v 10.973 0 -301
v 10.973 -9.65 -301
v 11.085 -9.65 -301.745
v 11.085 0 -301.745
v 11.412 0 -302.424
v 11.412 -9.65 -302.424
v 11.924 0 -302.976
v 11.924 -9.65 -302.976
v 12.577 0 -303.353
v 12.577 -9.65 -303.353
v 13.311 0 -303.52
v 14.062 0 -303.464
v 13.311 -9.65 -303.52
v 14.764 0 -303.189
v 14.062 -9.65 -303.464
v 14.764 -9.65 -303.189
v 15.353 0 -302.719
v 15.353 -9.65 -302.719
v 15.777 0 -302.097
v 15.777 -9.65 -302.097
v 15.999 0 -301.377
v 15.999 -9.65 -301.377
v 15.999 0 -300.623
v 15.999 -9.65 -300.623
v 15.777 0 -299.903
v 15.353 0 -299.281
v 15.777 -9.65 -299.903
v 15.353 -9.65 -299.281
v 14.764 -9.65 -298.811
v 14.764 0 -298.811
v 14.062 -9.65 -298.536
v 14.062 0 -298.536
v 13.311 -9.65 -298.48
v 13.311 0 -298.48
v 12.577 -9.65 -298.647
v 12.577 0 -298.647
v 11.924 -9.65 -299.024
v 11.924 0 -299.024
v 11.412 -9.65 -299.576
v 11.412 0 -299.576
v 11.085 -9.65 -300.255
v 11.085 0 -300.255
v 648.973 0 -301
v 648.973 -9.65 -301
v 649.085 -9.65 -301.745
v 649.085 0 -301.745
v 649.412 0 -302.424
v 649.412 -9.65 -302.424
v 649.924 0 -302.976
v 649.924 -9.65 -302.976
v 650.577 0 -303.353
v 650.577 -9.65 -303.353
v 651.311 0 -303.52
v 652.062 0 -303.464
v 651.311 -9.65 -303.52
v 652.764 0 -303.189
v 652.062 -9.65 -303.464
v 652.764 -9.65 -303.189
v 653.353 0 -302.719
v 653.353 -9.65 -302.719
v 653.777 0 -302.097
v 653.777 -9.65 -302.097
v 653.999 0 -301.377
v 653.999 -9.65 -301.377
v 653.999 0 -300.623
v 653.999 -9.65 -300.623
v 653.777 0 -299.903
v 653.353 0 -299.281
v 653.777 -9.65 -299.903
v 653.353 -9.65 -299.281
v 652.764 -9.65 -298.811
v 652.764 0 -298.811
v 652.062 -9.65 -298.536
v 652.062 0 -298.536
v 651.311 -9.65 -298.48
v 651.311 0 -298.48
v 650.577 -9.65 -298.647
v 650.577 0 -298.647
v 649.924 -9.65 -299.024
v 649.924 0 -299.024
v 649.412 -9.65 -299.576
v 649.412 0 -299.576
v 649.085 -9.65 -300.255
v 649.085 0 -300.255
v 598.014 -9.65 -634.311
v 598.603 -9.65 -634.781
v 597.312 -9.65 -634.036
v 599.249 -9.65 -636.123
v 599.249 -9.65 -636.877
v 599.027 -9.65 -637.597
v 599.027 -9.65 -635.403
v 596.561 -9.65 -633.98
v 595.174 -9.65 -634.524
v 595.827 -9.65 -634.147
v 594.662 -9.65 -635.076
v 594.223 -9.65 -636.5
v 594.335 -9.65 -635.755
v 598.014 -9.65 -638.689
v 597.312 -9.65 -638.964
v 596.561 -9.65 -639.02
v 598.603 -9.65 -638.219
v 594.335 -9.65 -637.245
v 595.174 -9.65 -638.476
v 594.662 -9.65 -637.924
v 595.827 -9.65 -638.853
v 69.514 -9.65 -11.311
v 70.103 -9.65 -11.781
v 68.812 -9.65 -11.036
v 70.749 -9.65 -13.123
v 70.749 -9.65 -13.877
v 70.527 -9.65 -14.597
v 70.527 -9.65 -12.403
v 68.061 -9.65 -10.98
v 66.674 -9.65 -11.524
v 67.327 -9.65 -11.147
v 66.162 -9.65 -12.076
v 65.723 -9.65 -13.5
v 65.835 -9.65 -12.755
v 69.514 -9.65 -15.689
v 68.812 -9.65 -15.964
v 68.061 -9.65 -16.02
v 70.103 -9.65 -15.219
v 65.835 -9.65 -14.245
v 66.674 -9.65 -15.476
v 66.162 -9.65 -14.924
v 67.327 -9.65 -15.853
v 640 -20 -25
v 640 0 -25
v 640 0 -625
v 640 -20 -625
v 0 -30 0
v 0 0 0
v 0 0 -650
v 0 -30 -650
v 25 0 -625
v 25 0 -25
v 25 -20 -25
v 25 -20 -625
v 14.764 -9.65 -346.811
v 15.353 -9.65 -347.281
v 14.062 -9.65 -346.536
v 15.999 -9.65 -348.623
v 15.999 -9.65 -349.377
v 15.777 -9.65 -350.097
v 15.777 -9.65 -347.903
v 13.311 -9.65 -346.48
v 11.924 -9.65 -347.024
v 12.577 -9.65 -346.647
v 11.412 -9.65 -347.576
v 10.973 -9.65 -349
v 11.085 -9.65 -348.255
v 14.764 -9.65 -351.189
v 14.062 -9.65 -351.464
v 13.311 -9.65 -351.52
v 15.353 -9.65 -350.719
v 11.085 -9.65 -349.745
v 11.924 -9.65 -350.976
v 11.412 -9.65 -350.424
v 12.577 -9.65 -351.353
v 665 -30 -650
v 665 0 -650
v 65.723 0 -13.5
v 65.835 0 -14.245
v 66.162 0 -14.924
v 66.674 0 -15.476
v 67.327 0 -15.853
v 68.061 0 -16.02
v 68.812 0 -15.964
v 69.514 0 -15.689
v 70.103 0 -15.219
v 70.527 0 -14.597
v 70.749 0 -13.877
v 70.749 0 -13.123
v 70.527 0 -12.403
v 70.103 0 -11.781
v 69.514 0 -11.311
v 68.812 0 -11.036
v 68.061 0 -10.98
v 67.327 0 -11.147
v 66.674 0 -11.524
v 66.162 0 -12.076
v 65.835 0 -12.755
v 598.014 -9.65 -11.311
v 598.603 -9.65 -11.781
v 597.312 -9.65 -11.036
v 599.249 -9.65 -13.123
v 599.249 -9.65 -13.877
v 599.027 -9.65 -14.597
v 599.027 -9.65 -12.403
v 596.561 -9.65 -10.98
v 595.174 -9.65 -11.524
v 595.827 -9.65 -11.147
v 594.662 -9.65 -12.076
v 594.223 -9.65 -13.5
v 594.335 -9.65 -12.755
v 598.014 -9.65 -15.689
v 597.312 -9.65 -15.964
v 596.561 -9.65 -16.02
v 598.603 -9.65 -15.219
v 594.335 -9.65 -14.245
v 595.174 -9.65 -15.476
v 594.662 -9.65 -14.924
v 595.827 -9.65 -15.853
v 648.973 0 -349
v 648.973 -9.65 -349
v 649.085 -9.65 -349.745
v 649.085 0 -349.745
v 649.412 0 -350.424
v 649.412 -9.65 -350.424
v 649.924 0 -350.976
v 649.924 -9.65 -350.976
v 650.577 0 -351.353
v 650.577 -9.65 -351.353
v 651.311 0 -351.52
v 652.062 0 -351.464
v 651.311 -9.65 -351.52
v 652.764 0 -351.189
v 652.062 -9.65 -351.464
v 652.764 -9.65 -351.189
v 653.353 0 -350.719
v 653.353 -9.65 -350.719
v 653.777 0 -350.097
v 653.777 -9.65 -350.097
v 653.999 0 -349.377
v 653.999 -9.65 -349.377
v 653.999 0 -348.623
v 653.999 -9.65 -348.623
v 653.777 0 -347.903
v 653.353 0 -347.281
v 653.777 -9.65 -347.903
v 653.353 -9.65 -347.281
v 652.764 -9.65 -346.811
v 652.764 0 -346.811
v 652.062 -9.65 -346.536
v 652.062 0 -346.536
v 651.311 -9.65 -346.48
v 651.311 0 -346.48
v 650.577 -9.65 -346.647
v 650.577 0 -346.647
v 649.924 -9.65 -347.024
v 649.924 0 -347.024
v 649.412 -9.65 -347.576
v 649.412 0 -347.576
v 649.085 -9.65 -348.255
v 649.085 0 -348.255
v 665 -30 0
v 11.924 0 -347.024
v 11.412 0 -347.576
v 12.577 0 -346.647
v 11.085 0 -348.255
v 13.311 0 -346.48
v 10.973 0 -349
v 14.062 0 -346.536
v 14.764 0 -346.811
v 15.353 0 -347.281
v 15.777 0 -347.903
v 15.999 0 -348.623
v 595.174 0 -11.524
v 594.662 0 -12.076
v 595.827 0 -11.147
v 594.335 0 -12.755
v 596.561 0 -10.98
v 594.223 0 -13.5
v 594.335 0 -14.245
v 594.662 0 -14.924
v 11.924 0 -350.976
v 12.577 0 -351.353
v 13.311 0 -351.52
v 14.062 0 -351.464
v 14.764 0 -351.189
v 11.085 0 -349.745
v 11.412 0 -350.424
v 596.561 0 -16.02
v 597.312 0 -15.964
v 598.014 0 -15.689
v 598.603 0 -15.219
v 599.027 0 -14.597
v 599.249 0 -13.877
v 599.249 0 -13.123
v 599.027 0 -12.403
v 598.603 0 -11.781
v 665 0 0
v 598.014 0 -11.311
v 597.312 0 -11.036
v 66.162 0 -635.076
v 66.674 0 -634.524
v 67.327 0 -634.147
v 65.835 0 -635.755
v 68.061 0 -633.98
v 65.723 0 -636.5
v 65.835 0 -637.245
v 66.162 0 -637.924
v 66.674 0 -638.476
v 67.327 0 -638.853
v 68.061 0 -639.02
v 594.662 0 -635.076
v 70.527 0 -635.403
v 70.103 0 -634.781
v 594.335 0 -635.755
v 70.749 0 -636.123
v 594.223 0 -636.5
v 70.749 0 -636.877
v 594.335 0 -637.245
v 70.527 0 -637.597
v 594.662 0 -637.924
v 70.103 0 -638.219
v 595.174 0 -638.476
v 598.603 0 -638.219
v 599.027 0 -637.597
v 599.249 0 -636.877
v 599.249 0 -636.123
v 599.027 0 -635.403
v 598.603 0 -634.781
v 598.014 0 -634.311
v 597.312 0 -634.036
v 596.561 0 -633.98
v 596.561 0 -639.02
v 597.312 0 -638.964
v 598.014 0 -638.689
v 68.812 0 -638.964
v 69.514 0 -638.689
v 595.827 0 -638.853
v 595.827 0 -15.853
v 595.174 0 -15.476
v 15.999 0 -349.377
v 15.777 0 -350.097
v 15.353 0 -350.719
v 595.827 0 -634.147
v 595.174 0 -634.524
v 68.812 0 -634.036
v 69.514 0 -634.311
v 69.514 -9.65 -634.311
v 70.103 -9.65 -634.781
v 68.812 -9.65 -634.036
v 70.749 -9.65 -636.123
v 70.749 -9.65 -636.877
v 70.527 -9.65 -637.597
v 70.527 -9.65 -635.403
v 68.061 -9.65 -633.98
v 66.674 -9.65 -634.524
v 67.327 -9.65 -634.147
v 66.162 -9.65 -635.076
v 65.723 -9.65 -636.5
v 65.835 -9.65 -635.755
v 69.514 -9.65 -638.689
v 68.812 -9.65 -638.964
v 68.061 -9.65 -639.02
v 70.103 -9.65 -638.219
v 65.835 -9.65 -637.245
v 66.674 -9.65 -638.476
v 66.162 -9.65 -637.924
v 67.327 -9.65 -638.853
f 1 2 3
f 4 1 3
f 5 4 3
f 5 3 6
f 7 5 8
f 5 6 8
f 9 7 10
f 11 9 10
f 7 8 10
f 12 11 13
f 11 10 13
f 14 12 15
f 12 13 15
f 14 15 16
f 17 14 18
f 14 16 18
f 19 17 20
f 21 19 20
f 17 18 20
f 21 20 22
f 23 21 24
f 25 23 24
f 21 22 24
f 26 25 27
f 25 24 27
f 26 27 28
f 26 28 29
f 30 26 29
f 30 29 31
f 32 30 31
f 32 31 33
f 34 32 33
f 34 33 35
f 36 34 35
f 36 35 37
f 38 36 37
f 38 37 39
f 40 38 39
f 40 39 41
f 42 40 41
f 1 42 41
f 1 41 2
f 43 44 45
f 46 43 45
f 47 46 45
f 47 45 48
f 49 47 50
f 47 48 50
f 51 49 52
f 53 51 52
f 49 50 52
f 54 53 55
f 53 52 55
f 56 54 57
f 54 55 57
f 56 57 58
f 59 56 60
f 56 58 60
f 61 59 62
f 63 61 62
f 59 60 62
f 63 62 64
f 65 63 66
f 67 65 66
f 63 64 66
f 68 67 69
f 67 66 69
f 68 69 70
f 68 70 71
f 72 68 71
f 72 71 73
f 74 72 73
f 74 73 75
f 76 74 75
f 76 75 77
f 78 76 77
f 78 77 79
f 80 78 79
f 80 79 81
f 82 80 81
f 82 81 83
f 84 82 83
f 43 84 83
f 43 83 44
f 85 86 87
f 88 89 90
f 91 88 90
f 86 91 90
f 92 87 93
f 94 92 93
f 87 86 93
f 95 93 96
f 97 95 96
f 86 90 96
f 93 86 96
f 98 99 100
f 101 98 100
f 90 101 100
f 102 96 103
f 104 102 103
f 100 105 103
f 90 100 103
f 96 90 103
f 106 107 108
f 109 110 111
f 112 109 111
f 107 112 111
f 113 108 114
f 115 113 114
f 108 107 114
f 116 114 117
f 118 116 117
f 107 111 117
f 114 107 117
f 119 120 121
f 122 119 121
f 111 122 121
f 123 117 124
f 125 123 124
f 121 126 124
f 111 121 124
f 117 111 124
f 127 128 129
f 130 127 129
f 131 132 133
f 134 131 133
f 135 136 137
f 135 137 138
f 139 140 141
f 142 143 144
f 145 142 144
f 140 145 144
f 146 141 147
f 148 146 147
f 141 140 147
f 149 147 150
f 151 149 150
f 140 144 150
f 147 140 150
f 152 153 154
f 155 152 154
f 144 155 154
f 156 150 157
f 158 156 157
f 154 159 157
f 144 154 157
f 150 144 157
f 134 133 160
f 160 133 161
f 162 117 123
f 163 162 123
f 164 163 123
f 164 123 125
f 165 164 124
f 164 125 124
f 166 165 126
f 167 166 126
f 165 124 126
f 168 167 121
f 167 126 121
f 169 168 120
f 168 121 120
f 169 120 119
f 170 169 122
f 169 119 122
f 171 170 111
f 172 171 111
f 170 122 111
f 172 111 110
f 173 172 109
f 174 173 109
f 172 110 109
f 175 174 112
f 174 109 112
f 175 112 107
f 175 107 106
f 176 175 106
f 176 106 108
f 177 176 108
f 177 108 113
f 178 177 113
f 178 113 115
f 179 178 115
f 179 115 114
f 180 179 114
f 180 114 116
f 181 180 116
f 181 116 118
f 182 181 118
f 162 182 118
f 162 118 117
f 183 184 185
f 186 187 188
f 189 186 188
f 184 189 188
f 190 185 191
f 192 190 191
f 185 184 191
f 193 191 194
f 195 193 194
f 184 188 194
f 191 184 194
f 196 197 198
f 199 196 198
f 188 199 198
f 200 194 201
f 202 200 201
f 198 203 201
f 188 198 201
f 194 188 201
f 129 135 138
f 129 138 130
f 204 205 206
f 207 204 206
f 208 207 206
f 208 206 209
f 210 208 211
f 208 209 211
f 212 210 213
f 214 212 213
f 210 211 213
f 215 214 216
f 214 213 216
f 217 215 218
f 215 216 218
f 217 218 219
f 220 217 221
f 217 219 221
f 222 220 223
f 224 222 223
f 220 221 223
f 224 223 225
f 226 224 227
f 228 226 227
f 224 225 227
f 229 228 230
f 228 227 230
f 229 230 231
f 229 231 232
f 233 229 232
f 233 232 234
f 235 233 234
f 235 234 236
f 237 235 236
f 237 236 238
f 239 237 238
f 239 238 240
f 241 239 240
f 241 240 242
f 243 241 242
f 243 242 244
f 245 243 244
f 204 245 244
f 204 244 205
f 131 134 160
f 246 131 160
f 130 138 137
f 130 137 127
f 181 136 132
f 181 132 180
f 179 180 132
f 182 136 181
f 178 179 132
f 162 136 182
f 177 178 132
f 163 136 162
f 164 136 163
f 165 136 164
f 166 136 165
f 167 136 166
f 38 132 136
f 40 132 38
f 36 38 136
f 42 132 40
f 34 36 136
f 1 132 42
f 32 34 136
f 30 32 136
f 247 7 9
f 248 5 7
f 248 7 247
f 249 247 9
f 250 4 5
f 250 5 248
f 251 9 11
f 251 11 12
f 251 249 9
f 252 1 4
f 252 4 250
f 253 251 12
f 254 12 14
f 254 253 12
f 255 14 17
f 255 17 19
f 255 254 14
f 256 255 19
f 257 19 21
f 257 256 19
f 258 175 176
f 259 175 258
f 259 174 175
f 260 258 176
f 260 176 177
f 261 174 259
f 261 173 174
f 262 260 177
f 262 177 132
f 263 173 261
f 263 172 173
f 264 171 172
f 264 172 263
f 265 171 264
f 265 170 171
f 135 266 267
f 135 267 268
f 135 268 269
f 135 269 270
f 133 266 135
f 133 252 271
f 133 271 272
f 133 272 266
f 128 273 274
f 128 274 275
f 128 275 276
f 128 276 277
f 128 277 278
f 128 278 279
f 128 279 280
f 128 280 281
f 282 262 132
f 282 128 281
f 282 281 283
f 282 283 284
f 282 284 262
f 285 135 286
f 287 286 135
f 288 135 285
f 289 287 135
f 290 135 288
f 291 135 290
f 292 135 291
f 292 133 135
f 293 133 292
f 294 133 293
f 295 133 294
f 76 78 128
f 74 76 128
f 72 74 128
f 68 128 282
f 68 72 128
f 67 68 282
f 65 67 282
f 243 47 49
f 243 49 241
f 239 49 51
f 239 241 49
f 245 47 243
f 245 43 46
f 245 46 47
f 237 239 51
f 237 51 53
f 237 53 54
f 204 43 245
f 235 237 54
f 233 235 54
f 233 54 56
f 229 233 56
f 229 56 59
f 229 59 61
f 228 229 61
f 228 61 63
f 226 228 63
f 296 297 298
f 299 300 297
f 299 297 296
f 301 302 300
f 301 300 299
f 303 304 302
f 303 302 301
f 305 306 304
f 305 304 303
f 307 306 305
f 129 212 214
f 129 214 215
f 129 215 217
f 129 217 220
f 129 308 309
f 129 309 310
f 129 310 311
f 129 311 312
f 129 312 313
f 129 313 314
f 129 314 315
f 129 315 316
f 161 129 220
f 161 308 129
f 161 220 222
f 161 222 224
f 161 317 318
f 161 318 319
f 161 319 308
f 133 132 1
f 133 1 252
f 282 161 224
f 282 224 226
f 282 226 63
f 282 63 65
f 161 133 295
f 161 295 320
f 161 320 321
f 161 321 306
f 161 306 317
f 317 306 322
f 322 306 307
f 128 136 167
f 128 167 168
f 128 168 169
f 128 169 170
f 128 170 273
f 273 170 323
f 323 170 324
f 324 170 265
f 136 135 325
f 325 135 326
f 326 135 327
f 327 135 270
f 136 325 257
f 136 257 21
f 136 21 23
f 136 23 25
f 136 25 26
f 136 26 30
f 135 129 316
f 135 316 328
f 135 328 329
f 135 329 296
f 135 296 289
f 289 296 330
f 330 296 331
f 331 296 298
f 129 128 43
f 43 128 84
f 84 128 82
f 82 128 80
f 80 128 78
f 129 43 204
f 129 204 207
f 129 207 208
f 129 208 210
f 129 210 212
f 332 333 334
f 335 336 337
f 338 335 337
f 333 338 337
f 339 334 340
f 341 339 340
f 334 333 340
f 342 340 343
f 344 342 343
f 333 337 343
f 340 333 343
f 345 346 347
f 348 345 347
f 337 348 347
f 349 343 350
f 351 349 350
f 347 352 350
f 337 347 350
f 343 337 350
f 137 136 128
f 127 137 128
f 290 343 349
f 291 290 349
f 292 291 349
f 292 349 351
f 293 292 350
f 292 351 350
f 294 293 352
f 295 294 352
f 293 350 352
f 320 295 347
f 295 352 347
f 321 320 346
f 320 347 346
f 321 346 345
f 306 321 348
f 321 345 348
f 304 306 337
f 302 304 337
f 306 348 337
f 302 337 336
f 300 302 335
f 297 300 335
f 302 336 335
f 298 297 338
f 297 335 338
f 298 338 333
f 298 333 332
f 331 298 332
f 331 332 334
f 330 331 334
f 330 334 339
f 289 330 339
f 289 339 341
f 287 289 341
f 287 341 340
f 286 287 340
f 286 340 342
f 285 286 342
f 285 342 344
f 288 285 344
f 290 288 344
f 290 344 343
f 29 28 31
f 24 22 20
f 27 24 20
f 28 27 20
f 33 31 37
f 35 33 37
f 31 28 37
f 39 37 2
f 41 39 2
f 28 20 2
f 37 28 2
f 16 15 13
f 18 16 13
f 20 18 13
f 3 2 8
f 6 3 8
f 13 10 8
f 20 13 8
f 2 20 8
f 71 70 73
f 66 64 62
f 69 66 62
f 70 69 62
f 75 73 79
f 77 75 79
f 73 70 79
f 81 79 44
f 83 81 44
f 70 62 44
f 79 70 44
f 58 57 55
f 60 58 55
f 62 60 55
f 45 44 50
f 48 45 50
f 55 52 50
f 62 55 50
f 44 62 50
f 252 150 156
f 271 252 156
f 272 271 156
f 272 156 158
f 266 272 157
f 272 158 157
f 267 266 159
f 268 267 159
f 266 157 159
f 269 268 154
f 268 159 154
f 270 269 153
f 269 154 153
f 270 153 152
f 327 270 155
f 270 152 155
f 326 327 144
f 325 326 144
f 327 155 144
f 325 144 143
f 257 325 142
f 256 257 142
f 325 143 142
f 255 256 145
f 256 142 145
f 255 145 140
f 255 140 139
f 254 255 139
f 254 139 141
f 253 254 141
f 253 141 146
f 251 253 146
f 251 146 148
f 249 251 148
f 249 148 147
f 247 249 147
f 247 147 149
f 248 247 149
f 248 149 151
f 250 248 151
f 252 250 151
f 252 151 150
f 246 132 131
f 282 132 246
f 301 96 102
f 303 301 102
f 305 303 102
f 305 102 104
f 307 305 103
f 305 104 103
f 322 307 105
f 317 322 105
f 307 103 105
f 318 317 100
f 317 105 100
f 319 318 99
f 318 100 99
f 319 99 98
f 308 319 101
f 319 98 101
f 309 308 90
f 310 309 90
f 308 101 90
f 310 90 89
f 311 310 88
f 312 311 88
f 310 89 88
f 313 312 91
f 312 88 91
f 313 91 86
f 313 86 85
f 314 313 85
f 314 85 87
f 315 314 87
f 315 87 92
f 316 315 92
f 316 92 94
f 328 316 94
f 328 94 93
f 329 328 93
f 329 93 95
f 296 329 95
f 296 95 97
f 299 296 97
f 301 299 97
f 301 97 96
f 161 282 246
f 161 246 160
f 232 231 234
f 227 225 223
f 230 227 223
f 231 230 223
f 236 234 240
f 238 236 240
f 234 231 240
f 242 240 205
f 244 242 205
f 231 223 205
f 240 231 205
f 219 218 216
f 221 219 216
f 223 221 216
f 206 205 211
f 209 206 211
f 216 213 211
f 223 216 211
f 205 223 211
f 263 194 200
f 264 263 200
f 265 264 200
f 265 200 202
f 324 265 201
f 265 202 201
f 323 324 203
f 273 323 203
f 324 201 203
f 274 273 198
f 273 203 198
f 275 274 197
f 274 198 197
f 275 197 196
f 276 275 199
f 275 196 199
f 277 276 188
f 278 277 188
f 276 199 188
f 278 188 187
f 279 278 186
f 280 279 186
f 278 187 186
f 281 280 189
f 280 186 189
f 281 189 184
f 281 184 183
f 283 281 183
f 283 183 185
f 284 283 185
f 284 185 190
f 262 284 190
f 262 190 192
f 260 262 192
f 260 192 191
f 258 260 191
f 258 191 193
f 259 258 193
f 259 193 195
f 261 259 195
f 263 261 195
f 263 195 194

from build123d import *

# Parameters (mm, degrees)
SKETCH1_W                      = 665
SKETCH1_H                      = 650
BOSS_EXTRUDE1_DEPTH            = 30
F_8_0_199_DIAMETER_HOLE1_D     = 5.0546
F_8_0_199_DIAMETER_HOLE1_DEPTH = 9.65
SKETCH4_W                      = 615
SKETCH4_H                      = 600
CUT_EXTRUDE1_DEPTH             = 20


with BuildPart() as part:
    # Sketch1 → Boss-Extrude1 (new body)
    with BuildSketch(Plane(origin=(0, 0, 0), x_dir=(1, 0, 0), z_dir=(0, 1, 0))):
        with Locations((332.5, 325)):
            Rectangle(SKETCH1_W, SKETCH1_H)
    extrude(amount=-BOSS_EXTRUDE1_DEPTH)

    # #8 (0.199) Diameter Hole1
    with Locations(Plane(origin=(0, 0, 0), x_dir=(1, 0, 0), z_dir=(0, 1, 0))):
        with Locations((68.25, 13.5), (13.5, 301), (596.75, 13.5), (651.5, 301), (651.5, 349), (596.75, 636.5), (68.25, 636.5), (13.5, 349)):
            Hole(F_8_0_199_DIAMETER_HOLE1_D / 2, depth=F_8_0_199_DIAMETER_HOLE1_DEPTH)

    # Sketch4 → Cut-Extrude1 (cut)
    with BuildSketch(Plane(origin=(0, 0, 0), x_dir=(1, 0, 0), z_dir=(0, 1, 0))):
        with Locations((332.5, 325)):
            Rectangle(SKETCH4_W, SKETCH4_H)
    extrude(amount=-CUT_EXTRUDE1_DEPTH, mode=Mode.SUBTRACT)


solid = part.part
